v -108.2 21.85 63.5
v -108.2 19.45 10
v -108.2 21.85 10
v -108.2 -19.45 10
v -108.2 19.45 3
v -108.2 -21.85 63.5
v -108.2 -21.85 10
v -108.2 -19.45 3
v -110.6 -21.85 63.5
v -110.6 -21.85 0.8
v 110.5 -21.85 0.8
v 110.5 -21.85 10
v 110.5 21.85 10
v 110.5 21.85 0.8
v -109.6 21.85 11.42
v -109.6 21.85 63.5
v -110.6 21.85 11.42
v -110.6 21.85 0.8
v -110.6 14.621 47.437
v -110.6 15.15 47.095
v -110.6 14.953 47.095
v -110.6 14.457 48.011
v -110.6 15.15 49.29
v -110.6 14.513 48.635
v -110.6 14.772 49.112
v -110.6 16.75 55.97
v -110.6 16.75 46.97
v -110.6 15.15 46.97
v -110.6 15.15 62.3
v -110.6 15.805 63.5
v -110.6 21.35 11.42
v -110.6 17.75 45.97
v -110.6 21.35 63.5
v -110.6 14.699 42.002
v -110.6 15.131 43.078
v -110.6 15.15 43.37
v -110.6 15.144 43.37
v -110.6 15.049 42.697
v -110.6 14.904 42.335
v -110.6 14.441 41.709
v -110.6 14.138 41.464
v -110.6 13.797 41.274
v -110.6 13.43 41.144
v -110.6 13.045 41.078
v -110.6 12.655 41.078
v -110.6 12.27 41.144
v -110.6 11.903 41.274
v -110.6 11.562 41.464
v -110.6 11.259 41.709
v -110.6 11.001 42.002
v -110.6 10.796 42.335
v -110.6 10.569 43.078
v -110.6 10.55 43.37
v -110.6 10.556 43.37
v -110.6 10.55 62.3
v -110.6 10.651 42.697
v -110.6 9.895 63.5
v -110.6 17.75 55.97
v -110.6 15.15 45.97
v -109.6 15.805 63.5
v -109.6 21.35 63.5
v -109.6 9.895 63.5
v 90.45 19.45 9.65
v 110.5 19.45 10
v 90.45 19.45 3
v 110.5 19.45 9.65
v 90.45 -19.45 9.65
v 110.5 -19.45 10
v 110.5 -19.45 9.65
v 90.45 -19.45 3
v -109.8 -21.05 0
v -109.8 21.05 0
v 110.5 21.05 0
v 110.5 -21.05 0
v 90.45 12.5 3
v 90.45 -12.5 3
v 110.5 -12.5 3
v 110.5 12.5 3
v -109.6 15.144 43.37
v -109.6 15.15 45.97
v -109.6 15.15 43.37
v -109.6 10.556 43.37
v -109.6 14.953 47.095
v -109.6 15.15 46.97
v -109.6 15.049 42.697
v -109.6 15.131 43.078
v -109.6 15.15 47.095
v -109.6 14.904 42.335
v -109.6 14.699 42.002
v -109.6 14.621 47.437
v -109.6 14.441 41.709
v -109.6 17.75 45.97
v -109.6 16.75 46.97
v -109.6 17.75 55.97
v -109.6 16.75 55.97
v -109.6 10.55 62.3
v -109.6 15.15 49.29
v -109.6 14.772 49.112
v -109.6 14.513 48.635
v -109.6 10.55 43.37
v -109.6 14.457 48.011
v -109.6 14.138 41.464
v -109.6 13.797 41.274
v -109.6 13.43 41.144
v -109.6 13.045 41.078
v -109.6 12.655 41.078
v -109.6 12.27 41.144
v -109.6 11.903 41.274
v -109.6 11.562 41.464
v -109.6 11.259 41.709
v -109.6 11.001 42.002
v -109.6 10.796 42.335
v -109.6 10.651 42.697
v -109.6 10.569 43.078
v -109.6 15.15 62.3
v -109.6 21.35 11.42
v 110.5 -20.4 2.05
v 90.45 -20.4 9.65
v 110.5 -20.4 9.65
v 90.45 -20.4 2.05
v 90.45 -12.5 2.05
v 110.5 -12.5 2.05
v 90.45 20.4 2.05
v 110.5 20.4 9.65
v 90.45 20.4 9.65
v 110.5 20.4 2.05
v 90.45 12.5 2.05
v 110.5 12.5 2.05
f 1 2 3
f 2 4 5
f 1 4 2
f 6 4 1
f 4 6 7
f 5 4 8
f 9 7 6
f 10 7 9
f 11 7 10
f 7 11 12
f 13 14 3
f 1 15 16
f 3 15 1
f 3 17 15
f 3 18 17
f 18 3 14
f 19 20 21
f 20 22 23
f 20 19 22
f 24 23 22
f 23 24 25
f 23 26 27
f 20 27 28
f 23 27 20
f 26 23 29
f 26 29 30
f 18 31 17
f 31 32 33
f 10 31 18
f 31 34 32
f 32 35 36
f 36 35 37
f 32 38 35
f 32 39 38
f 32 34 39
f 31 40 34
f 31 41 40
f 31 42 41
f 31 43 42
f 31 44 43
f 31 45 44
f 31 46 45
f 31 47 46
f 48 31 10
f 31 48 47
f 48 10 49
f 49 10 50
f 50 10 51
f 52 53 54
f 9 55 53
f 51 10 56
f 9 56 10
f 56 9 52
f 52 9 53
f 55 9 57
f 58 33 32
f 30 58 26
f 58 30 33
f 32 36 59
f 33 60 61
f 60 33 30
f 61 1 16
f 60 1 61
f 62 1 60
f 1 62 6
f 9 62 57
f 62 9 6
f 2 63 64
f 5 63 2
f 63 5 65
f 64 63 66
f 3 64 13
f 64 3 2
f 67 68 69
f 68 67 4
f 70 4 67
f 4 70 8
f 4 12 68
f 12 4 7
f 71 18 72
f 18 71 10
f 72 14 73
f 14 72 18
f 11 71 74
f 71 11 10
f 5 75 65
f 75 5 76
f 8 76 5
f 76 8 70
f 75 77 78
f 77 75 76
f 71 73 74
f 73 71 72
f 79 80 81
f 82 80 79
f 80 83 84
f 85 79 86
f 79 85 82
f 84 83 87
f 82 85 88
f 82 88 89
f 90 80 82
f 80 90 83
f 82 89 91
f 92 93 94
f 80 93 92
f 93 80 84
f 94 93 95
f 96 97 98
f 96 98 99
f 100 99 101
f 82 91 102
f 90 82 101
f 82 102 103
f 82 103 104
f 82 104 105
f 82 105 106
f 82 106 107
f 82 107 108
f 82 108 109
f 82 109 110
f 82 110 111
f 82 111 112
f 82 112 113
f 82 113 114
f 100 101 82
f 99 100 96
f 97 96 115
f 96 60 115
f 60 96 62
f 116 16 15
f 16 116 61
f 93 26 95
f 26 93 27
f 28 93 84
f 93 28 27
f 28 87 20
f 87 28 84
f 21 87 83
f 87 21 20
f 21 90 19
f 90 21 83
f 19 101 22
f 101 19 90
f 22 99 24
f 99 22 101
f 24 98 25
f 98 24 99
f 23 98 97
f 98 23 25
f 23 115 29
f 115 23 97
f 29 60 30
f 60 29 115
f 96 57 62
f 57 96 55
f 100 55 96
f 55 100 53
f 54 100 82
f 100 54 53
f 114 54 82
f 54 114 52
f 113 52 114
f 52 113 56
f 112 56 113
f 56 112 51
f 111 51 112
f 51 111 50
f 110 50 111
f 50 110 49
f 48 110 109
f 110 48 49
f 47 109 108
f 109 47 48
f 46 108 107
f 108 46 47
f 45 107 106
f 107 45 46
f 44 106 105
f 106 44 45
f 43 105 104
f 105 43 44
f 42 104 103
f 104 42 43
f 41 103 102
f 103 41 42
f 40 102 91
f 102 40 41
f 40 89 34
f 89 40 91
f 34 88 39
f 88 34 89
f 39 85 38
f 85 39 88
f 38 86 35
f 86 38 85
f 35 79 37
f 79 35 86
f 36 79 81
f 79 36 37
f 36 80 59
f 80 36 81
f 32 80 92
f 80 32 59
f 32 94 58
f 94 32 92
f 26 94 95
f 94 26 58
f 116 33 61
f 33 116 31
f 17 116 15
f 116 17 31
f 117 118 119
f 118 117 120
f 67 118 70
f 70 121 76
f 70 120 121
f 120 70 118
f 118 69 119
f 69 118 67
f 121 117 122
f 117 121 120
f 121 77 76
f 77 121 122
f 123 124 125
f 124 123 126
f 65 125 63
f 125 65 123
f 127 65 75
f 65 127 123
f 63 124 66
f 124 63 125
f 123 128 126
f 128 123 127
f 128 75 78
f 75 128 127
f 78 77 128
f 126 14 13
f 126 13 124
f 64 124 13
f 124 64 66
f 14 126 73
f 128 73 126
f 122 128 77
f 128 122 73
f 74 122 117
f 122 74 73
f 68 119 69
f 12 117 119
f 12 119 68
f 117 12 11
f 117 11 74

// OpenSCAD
/* =====================================================
   UniFi Toolless Mini Rack — OCD Panel (earless)
   =====================================================
   Filler panels for the UniFi Toolless Mini Rack
   (U-Rack-6U-TL). That rack has no 19" rails, so the usual
   eared blanks don't fit. Like Ubiquiti's own OCD panels
   (UACC-Rack-Panel-*), these are a U-channel with no ears:
   a front face plus two side flanges that slide in between
   the rack's side slats, sit on a slot's ledge, and catch
   that slot's side pin in a slot in each flange.

   Rack geometry (measured from Ubiquiti's 3D model of the
   U-Rack-6U-TL; see unifi_ocd_panel.md):
     slot pitch       48 mm (not EIA 44.45)
     slat-to-slat     444.4 mm clear
     side pin         Ø4, 9 mm above the ledge top,
                      42.4 mm behind the post front,
                      sticks 4.5 mm in from the slat
     ledge            1.65 mm sheet, 19.7 mm in from the
                      slat, ends 10.9 mm behind the post
                      front

   Panel (matches Ubiquiti's: 442.4 wide, 63.5 deep,
   43.7 / 87.4 tall). Too wide for most beds, so it splits
   into `pieces` that butt together and are glued with
   L-shaped splices tucked into pockets in the top and
   bottom returns.

   A small detent spring in each pin slot clicks over the
   pin as the panel seats, so it can't creep forward.

   Coordinates (assembled): X across (centred), Y back
   from the front face, Z up from the ledge top.
   ===================================================== */

$fa = 2;
$fs = 0.4;

/* ── Selection (set by presets) ─────────────────────── */
part   = "panel";   // [panel, splice, fit_test, assembled, none]
style  = "blank";   // [blank, vented, passthrough]
units  = 1;         // rack slots tall: 1 or 2
piece  = 0;         // which piece of the split panel (0 = left)

/* ── Split ──────────────────────────────────────────── */
pieces    = 2;      // 1 = one piece (needs a ~450 mm bed)
seam_gap  = 0.1;    // per side, at each butt seam

/* ── Rack (measured) ────────────────────────────────── */
slot_pitch   = 48;
pin_d        = 3.98;
pin_z        = 9.0;     // pin centre above the ledge top
pin_setback  = 42.37;   // pin centre behind the post front
ledge_t      = 1.65;
ledge_front  = 10.92;   // ledge front edge behind the post front

/* ── Panel ──────────────────────────────────────────── */
W           = 442.4;    // overall width (rack clear: 444.4)
D           = 63.5;     // overall depth
U_H         = 43.7;     // height per unit (UniFi 1U gear)
front_proud = 1.0;      // face sits this far proud of the posts
face_t      = 3.0;
flange_t    = 2.4;      // side flanges
return_t    = 2.4;      // top/bottom returns
return_d    = 10;       // returns, measured from the front
chamfer     = 0.8;      // front edge chamfer

/* ── Pin slot + detent ──────────────────────────────── */
slot_w      = 4.6;      // pin 3.98 + clearance
lead_in     = 1.2;      // chamfer at the slot mouth
bump_h      = 0.7;      // detent bump height (pin rides 0.3 over the floor)
spring_t    = 1.6;      // detent beam thickness
spring_len  = 10;       // detent beam length (cantilever)
relief_w    = 1.0;      // cut that frees the beam

/* ── Splice ─────────────────────────────────────────── */
splice_len  = 40;
splice_t    = 1.6;
splice_drop = 6;        // leg down the back of the face
pocket_d    = 0.8;      // pocket depth into face / return
splice_clr  = 0.15;

/* ── Styles ─────────────────────────────────────────── */
vent_w      = 3;
vent_pitch  = 6;
vent_margin = 12;       // keep vents this far off the seams
vent_edge   = 24;       // ...and off the side flanges
pass_w      = 400;      // pass-through opening (Ubiquiti brush panel)
pass_h_1u   = 24;

/* ── Derived ────────────────────────────────────────── */
// Scenes `include` this file and set $units / $style per panel.
$units = units;
$style = style;
function ph() = $units * U_H;
eps   = 0.01;
pin_y = front_proud + pin_setback;        // pin centre, from the face
seams = [for (k = [1 : pieces - 1]) -W/2 + k * W / pieces];
splice_xs = seams;

/* ── Body ───────────────────────────────────────────── */

module face_slab() {
    hull() {
        translate([-W/2 + chamfer, 0, chamfer])
            cube([W - 2*chamfer, eps, ph() - 2*chamfer]);
        translate([-W/2, chamfer, 0]) cube([W, face_t - chamfer, ph()]);
    }
}

module channel() {
    face_slab();
    // side flanges
    for (s = [-1, 1])
        translate([s > 0 ? W/2 - flange_t : -W/2, face_t - eps, 0])
            cube([flange_t, D - face_t + eps, ph()]);
    // top / bottom returns
    for (z = [0, ph() - return_t])
        translate([-W/2, face_t - eps, z])
            cube([W, return_d - face_t + eps, return_t]);
}

/* ── Pin slot with detent, in the YZ plane of a flange ─ */
// 2D in (y, z): y back from the face, z up from the ledge.

module pin_slot_2d(zc) {
    r  = slot_w / 2;
    zb = zc - r;                     // slot floor
    // the slot, open to the back edge, round end on the pin
    translate([pin_y, zc]) circle(r = r);
    translate([pin_y, zb]) square([D - pin_y + 1, slot_w]);
    // lead-in at the mouth
    translate([D, zc])
        polygon([[1, -r - lead_in], [1, r + lead_in], [-lead_in, r], [-lead_in, -r]]);
    // detent: cantilever beam under the slot floor, rooted at the
    // back, free just behind the seated pin
    tip = pin_y + r + 0.3;
    translate([tip, zb - spring_t - relief_w]) square([spring_len, relief_w]);
    translate([tip, zb - spring_t - relief_w]) square([relief_w, spring_t + relief_w + eps]);
}

module bump_2d(zc) {
    // rides on the beam's free end, pokes up into the slot
    translate([pin_y + slot_w/2 + 0.3 + relief_w + 1.2, zc - slot_w/2])
        scale([1.6, 1]) circle(r = bump_h);
}

// Notch that lets a 2U flange pass over the middle ledge.
module ledge_notch_2d(k) {
    z0 = k * slot_pitch;
    y0 = front_proud + ledge_front - 0.5;
    translate([y0, z0 - ledge_t - 0.5]) square([D - y0 + 1, ledge_t + 1.0]);
}

module flange_cuts() {
    for (s = [-1, 1])
        translate([s * W/2, 0, 0]) rotate([90, 0, 90])
            translate([0, 0, -flange_t - 1]) linear_extrude(flange_t + 2)
                difference() {
                    union() {
                        for (k = [0 : $units - 1]) pin_slot_2d(k * slot_pitch + pin_z);
                        for (k = [1 : $units - 1]) ledge_notch_2d(k);
                    }
                    for (k = [0 : $units - 1]) bump_2d(k * slot_pitch + pin_z);
                }
}

/* ── Face styles ────────────────────────────────────── */

function near_seam(x, m) = len([for (s = seams) if (abs(x - s) < m) 1]) > 0;

module vent_cuts() {
    vh = ph() - 2 * (return_t + 9);
    n  = floor((W - 2 * vent_edge) / vent_pitch);
    x0 = -(n - 1) * vent_pitch / 2;
    for (i = [0 : n - 1]) {
        x = x0 + i * vent_pitch;
        if (!near_seam(x, vent_margin))
            translate([x, -1, ph()/2]) rotate([-90, 0, 0])
                hull() for (z = [-1, 1])
                    translate([0, z * (vh - vent_w) / 2, 0])
                        cylinder(d = vent_w, h = face_t + 2);
    }
}

module pass_cut() {
    oh = $units == 1 ? pass_h_1u : ph() - 2 * (return_t + 8);
    translate([0, -1, ph()/2]) rotate([-90, 0, 0])
        hull() for (x = [-1, 1])
            translate([x * (pass_w - oh) / 2, 0, 0]) cylinder(d = oh, h = face_t + 2);
}

/* ── Splice (L-bar, glued across a seam) ────────────── */
// Top splice in assembled position, centred on x = 0.
module splice_top(clr = 0) {
    zt = ph() - return_t + pocket_d;      // top of leg in the return pocket
    translate([-splice_len/2 - clr, face_t - pocket_d - clr, zt - splice_t - clr])
        cube([splice_len + 2*clr, return_d - 0.5 - (face_t - pocket_d) + 2*clr, splice_t + 2*clr]);
    translate([-splice_len/2 - clr, face_t - pocket_d - clr, zt - splice_t - splice_drop - clr])
        cube([splice_len + 2*clr, splice_t + 2*clr, splice_t + splice_drop + 2*clr]);
}

module splice_at(x, clr = 0) {
    translate([x, 0, 0]) {
        splice_top(clr);
        translate([0, 0, ph()]) mirror([0, 0, 1]) splice_top(clr);
    }
}

/* ── Assembled panel and pieces ─────────────────────── */

module panel_full() {
    difference() {
        channel();
        flange_cuts();
        if ($style == "vented")      vent_cuts();
        if ($style == "passthrough") pass_cut();
        for (x = splice_xs) splice_at(x, splice_clr);
    }
}

module piece_range(i) {
    x0 = i == 0          ? -W/2 - 1 : seams[i - 1] + seam_gap;
    x1 = i == pieces - 1 ?  W/2 + 1 : seams[i]     - seam_gap;
    translate([x0, -1, -1]) cube([x1 - x0, D + 2, ph() + 2]);
}

module panel_piece(i) {
    intersection() { panel_full(); piece_range(i); }
}

/* ── Print layouts ──────────────────────────────────── */

// Face down on the bed; flanges and returns stand up.
module face_down() { rotate([90, 0, 0]) children(); }

if (part == "panel") {
    // centre the piece on the bed
    cx = -W/2 + (piece + 0.5) * W / pieces;
    face_down() translate([-cx, 0, -ph()/2]) panel_piece(piece);
} else if (part == "splice") {
    // short leg flat on the bed, long leg standing
    translate([0, 0, -(face_t - pocket_d)]) rotate([90, 0, 0]) splice_top();
} else if (part == "fit_test") {
    // the right-hand end of the panel: flange, slot, detent, a bit of face
    w = 30;
    face_down() translate([-(W/2 - w/2), 0, -ph()/2])
        intersection() {
            panel_full();
            translate([W/2 - w, -1, -1]) cube([w + 1, D + 2, ph() + 2]);
        }
} else if (part == "assembled") {
    // assembled (for checking)
    for (i = [0 : pieces - 1]) panel_piece(i);
    for (x = splice_xs) splice_at(x);
}
